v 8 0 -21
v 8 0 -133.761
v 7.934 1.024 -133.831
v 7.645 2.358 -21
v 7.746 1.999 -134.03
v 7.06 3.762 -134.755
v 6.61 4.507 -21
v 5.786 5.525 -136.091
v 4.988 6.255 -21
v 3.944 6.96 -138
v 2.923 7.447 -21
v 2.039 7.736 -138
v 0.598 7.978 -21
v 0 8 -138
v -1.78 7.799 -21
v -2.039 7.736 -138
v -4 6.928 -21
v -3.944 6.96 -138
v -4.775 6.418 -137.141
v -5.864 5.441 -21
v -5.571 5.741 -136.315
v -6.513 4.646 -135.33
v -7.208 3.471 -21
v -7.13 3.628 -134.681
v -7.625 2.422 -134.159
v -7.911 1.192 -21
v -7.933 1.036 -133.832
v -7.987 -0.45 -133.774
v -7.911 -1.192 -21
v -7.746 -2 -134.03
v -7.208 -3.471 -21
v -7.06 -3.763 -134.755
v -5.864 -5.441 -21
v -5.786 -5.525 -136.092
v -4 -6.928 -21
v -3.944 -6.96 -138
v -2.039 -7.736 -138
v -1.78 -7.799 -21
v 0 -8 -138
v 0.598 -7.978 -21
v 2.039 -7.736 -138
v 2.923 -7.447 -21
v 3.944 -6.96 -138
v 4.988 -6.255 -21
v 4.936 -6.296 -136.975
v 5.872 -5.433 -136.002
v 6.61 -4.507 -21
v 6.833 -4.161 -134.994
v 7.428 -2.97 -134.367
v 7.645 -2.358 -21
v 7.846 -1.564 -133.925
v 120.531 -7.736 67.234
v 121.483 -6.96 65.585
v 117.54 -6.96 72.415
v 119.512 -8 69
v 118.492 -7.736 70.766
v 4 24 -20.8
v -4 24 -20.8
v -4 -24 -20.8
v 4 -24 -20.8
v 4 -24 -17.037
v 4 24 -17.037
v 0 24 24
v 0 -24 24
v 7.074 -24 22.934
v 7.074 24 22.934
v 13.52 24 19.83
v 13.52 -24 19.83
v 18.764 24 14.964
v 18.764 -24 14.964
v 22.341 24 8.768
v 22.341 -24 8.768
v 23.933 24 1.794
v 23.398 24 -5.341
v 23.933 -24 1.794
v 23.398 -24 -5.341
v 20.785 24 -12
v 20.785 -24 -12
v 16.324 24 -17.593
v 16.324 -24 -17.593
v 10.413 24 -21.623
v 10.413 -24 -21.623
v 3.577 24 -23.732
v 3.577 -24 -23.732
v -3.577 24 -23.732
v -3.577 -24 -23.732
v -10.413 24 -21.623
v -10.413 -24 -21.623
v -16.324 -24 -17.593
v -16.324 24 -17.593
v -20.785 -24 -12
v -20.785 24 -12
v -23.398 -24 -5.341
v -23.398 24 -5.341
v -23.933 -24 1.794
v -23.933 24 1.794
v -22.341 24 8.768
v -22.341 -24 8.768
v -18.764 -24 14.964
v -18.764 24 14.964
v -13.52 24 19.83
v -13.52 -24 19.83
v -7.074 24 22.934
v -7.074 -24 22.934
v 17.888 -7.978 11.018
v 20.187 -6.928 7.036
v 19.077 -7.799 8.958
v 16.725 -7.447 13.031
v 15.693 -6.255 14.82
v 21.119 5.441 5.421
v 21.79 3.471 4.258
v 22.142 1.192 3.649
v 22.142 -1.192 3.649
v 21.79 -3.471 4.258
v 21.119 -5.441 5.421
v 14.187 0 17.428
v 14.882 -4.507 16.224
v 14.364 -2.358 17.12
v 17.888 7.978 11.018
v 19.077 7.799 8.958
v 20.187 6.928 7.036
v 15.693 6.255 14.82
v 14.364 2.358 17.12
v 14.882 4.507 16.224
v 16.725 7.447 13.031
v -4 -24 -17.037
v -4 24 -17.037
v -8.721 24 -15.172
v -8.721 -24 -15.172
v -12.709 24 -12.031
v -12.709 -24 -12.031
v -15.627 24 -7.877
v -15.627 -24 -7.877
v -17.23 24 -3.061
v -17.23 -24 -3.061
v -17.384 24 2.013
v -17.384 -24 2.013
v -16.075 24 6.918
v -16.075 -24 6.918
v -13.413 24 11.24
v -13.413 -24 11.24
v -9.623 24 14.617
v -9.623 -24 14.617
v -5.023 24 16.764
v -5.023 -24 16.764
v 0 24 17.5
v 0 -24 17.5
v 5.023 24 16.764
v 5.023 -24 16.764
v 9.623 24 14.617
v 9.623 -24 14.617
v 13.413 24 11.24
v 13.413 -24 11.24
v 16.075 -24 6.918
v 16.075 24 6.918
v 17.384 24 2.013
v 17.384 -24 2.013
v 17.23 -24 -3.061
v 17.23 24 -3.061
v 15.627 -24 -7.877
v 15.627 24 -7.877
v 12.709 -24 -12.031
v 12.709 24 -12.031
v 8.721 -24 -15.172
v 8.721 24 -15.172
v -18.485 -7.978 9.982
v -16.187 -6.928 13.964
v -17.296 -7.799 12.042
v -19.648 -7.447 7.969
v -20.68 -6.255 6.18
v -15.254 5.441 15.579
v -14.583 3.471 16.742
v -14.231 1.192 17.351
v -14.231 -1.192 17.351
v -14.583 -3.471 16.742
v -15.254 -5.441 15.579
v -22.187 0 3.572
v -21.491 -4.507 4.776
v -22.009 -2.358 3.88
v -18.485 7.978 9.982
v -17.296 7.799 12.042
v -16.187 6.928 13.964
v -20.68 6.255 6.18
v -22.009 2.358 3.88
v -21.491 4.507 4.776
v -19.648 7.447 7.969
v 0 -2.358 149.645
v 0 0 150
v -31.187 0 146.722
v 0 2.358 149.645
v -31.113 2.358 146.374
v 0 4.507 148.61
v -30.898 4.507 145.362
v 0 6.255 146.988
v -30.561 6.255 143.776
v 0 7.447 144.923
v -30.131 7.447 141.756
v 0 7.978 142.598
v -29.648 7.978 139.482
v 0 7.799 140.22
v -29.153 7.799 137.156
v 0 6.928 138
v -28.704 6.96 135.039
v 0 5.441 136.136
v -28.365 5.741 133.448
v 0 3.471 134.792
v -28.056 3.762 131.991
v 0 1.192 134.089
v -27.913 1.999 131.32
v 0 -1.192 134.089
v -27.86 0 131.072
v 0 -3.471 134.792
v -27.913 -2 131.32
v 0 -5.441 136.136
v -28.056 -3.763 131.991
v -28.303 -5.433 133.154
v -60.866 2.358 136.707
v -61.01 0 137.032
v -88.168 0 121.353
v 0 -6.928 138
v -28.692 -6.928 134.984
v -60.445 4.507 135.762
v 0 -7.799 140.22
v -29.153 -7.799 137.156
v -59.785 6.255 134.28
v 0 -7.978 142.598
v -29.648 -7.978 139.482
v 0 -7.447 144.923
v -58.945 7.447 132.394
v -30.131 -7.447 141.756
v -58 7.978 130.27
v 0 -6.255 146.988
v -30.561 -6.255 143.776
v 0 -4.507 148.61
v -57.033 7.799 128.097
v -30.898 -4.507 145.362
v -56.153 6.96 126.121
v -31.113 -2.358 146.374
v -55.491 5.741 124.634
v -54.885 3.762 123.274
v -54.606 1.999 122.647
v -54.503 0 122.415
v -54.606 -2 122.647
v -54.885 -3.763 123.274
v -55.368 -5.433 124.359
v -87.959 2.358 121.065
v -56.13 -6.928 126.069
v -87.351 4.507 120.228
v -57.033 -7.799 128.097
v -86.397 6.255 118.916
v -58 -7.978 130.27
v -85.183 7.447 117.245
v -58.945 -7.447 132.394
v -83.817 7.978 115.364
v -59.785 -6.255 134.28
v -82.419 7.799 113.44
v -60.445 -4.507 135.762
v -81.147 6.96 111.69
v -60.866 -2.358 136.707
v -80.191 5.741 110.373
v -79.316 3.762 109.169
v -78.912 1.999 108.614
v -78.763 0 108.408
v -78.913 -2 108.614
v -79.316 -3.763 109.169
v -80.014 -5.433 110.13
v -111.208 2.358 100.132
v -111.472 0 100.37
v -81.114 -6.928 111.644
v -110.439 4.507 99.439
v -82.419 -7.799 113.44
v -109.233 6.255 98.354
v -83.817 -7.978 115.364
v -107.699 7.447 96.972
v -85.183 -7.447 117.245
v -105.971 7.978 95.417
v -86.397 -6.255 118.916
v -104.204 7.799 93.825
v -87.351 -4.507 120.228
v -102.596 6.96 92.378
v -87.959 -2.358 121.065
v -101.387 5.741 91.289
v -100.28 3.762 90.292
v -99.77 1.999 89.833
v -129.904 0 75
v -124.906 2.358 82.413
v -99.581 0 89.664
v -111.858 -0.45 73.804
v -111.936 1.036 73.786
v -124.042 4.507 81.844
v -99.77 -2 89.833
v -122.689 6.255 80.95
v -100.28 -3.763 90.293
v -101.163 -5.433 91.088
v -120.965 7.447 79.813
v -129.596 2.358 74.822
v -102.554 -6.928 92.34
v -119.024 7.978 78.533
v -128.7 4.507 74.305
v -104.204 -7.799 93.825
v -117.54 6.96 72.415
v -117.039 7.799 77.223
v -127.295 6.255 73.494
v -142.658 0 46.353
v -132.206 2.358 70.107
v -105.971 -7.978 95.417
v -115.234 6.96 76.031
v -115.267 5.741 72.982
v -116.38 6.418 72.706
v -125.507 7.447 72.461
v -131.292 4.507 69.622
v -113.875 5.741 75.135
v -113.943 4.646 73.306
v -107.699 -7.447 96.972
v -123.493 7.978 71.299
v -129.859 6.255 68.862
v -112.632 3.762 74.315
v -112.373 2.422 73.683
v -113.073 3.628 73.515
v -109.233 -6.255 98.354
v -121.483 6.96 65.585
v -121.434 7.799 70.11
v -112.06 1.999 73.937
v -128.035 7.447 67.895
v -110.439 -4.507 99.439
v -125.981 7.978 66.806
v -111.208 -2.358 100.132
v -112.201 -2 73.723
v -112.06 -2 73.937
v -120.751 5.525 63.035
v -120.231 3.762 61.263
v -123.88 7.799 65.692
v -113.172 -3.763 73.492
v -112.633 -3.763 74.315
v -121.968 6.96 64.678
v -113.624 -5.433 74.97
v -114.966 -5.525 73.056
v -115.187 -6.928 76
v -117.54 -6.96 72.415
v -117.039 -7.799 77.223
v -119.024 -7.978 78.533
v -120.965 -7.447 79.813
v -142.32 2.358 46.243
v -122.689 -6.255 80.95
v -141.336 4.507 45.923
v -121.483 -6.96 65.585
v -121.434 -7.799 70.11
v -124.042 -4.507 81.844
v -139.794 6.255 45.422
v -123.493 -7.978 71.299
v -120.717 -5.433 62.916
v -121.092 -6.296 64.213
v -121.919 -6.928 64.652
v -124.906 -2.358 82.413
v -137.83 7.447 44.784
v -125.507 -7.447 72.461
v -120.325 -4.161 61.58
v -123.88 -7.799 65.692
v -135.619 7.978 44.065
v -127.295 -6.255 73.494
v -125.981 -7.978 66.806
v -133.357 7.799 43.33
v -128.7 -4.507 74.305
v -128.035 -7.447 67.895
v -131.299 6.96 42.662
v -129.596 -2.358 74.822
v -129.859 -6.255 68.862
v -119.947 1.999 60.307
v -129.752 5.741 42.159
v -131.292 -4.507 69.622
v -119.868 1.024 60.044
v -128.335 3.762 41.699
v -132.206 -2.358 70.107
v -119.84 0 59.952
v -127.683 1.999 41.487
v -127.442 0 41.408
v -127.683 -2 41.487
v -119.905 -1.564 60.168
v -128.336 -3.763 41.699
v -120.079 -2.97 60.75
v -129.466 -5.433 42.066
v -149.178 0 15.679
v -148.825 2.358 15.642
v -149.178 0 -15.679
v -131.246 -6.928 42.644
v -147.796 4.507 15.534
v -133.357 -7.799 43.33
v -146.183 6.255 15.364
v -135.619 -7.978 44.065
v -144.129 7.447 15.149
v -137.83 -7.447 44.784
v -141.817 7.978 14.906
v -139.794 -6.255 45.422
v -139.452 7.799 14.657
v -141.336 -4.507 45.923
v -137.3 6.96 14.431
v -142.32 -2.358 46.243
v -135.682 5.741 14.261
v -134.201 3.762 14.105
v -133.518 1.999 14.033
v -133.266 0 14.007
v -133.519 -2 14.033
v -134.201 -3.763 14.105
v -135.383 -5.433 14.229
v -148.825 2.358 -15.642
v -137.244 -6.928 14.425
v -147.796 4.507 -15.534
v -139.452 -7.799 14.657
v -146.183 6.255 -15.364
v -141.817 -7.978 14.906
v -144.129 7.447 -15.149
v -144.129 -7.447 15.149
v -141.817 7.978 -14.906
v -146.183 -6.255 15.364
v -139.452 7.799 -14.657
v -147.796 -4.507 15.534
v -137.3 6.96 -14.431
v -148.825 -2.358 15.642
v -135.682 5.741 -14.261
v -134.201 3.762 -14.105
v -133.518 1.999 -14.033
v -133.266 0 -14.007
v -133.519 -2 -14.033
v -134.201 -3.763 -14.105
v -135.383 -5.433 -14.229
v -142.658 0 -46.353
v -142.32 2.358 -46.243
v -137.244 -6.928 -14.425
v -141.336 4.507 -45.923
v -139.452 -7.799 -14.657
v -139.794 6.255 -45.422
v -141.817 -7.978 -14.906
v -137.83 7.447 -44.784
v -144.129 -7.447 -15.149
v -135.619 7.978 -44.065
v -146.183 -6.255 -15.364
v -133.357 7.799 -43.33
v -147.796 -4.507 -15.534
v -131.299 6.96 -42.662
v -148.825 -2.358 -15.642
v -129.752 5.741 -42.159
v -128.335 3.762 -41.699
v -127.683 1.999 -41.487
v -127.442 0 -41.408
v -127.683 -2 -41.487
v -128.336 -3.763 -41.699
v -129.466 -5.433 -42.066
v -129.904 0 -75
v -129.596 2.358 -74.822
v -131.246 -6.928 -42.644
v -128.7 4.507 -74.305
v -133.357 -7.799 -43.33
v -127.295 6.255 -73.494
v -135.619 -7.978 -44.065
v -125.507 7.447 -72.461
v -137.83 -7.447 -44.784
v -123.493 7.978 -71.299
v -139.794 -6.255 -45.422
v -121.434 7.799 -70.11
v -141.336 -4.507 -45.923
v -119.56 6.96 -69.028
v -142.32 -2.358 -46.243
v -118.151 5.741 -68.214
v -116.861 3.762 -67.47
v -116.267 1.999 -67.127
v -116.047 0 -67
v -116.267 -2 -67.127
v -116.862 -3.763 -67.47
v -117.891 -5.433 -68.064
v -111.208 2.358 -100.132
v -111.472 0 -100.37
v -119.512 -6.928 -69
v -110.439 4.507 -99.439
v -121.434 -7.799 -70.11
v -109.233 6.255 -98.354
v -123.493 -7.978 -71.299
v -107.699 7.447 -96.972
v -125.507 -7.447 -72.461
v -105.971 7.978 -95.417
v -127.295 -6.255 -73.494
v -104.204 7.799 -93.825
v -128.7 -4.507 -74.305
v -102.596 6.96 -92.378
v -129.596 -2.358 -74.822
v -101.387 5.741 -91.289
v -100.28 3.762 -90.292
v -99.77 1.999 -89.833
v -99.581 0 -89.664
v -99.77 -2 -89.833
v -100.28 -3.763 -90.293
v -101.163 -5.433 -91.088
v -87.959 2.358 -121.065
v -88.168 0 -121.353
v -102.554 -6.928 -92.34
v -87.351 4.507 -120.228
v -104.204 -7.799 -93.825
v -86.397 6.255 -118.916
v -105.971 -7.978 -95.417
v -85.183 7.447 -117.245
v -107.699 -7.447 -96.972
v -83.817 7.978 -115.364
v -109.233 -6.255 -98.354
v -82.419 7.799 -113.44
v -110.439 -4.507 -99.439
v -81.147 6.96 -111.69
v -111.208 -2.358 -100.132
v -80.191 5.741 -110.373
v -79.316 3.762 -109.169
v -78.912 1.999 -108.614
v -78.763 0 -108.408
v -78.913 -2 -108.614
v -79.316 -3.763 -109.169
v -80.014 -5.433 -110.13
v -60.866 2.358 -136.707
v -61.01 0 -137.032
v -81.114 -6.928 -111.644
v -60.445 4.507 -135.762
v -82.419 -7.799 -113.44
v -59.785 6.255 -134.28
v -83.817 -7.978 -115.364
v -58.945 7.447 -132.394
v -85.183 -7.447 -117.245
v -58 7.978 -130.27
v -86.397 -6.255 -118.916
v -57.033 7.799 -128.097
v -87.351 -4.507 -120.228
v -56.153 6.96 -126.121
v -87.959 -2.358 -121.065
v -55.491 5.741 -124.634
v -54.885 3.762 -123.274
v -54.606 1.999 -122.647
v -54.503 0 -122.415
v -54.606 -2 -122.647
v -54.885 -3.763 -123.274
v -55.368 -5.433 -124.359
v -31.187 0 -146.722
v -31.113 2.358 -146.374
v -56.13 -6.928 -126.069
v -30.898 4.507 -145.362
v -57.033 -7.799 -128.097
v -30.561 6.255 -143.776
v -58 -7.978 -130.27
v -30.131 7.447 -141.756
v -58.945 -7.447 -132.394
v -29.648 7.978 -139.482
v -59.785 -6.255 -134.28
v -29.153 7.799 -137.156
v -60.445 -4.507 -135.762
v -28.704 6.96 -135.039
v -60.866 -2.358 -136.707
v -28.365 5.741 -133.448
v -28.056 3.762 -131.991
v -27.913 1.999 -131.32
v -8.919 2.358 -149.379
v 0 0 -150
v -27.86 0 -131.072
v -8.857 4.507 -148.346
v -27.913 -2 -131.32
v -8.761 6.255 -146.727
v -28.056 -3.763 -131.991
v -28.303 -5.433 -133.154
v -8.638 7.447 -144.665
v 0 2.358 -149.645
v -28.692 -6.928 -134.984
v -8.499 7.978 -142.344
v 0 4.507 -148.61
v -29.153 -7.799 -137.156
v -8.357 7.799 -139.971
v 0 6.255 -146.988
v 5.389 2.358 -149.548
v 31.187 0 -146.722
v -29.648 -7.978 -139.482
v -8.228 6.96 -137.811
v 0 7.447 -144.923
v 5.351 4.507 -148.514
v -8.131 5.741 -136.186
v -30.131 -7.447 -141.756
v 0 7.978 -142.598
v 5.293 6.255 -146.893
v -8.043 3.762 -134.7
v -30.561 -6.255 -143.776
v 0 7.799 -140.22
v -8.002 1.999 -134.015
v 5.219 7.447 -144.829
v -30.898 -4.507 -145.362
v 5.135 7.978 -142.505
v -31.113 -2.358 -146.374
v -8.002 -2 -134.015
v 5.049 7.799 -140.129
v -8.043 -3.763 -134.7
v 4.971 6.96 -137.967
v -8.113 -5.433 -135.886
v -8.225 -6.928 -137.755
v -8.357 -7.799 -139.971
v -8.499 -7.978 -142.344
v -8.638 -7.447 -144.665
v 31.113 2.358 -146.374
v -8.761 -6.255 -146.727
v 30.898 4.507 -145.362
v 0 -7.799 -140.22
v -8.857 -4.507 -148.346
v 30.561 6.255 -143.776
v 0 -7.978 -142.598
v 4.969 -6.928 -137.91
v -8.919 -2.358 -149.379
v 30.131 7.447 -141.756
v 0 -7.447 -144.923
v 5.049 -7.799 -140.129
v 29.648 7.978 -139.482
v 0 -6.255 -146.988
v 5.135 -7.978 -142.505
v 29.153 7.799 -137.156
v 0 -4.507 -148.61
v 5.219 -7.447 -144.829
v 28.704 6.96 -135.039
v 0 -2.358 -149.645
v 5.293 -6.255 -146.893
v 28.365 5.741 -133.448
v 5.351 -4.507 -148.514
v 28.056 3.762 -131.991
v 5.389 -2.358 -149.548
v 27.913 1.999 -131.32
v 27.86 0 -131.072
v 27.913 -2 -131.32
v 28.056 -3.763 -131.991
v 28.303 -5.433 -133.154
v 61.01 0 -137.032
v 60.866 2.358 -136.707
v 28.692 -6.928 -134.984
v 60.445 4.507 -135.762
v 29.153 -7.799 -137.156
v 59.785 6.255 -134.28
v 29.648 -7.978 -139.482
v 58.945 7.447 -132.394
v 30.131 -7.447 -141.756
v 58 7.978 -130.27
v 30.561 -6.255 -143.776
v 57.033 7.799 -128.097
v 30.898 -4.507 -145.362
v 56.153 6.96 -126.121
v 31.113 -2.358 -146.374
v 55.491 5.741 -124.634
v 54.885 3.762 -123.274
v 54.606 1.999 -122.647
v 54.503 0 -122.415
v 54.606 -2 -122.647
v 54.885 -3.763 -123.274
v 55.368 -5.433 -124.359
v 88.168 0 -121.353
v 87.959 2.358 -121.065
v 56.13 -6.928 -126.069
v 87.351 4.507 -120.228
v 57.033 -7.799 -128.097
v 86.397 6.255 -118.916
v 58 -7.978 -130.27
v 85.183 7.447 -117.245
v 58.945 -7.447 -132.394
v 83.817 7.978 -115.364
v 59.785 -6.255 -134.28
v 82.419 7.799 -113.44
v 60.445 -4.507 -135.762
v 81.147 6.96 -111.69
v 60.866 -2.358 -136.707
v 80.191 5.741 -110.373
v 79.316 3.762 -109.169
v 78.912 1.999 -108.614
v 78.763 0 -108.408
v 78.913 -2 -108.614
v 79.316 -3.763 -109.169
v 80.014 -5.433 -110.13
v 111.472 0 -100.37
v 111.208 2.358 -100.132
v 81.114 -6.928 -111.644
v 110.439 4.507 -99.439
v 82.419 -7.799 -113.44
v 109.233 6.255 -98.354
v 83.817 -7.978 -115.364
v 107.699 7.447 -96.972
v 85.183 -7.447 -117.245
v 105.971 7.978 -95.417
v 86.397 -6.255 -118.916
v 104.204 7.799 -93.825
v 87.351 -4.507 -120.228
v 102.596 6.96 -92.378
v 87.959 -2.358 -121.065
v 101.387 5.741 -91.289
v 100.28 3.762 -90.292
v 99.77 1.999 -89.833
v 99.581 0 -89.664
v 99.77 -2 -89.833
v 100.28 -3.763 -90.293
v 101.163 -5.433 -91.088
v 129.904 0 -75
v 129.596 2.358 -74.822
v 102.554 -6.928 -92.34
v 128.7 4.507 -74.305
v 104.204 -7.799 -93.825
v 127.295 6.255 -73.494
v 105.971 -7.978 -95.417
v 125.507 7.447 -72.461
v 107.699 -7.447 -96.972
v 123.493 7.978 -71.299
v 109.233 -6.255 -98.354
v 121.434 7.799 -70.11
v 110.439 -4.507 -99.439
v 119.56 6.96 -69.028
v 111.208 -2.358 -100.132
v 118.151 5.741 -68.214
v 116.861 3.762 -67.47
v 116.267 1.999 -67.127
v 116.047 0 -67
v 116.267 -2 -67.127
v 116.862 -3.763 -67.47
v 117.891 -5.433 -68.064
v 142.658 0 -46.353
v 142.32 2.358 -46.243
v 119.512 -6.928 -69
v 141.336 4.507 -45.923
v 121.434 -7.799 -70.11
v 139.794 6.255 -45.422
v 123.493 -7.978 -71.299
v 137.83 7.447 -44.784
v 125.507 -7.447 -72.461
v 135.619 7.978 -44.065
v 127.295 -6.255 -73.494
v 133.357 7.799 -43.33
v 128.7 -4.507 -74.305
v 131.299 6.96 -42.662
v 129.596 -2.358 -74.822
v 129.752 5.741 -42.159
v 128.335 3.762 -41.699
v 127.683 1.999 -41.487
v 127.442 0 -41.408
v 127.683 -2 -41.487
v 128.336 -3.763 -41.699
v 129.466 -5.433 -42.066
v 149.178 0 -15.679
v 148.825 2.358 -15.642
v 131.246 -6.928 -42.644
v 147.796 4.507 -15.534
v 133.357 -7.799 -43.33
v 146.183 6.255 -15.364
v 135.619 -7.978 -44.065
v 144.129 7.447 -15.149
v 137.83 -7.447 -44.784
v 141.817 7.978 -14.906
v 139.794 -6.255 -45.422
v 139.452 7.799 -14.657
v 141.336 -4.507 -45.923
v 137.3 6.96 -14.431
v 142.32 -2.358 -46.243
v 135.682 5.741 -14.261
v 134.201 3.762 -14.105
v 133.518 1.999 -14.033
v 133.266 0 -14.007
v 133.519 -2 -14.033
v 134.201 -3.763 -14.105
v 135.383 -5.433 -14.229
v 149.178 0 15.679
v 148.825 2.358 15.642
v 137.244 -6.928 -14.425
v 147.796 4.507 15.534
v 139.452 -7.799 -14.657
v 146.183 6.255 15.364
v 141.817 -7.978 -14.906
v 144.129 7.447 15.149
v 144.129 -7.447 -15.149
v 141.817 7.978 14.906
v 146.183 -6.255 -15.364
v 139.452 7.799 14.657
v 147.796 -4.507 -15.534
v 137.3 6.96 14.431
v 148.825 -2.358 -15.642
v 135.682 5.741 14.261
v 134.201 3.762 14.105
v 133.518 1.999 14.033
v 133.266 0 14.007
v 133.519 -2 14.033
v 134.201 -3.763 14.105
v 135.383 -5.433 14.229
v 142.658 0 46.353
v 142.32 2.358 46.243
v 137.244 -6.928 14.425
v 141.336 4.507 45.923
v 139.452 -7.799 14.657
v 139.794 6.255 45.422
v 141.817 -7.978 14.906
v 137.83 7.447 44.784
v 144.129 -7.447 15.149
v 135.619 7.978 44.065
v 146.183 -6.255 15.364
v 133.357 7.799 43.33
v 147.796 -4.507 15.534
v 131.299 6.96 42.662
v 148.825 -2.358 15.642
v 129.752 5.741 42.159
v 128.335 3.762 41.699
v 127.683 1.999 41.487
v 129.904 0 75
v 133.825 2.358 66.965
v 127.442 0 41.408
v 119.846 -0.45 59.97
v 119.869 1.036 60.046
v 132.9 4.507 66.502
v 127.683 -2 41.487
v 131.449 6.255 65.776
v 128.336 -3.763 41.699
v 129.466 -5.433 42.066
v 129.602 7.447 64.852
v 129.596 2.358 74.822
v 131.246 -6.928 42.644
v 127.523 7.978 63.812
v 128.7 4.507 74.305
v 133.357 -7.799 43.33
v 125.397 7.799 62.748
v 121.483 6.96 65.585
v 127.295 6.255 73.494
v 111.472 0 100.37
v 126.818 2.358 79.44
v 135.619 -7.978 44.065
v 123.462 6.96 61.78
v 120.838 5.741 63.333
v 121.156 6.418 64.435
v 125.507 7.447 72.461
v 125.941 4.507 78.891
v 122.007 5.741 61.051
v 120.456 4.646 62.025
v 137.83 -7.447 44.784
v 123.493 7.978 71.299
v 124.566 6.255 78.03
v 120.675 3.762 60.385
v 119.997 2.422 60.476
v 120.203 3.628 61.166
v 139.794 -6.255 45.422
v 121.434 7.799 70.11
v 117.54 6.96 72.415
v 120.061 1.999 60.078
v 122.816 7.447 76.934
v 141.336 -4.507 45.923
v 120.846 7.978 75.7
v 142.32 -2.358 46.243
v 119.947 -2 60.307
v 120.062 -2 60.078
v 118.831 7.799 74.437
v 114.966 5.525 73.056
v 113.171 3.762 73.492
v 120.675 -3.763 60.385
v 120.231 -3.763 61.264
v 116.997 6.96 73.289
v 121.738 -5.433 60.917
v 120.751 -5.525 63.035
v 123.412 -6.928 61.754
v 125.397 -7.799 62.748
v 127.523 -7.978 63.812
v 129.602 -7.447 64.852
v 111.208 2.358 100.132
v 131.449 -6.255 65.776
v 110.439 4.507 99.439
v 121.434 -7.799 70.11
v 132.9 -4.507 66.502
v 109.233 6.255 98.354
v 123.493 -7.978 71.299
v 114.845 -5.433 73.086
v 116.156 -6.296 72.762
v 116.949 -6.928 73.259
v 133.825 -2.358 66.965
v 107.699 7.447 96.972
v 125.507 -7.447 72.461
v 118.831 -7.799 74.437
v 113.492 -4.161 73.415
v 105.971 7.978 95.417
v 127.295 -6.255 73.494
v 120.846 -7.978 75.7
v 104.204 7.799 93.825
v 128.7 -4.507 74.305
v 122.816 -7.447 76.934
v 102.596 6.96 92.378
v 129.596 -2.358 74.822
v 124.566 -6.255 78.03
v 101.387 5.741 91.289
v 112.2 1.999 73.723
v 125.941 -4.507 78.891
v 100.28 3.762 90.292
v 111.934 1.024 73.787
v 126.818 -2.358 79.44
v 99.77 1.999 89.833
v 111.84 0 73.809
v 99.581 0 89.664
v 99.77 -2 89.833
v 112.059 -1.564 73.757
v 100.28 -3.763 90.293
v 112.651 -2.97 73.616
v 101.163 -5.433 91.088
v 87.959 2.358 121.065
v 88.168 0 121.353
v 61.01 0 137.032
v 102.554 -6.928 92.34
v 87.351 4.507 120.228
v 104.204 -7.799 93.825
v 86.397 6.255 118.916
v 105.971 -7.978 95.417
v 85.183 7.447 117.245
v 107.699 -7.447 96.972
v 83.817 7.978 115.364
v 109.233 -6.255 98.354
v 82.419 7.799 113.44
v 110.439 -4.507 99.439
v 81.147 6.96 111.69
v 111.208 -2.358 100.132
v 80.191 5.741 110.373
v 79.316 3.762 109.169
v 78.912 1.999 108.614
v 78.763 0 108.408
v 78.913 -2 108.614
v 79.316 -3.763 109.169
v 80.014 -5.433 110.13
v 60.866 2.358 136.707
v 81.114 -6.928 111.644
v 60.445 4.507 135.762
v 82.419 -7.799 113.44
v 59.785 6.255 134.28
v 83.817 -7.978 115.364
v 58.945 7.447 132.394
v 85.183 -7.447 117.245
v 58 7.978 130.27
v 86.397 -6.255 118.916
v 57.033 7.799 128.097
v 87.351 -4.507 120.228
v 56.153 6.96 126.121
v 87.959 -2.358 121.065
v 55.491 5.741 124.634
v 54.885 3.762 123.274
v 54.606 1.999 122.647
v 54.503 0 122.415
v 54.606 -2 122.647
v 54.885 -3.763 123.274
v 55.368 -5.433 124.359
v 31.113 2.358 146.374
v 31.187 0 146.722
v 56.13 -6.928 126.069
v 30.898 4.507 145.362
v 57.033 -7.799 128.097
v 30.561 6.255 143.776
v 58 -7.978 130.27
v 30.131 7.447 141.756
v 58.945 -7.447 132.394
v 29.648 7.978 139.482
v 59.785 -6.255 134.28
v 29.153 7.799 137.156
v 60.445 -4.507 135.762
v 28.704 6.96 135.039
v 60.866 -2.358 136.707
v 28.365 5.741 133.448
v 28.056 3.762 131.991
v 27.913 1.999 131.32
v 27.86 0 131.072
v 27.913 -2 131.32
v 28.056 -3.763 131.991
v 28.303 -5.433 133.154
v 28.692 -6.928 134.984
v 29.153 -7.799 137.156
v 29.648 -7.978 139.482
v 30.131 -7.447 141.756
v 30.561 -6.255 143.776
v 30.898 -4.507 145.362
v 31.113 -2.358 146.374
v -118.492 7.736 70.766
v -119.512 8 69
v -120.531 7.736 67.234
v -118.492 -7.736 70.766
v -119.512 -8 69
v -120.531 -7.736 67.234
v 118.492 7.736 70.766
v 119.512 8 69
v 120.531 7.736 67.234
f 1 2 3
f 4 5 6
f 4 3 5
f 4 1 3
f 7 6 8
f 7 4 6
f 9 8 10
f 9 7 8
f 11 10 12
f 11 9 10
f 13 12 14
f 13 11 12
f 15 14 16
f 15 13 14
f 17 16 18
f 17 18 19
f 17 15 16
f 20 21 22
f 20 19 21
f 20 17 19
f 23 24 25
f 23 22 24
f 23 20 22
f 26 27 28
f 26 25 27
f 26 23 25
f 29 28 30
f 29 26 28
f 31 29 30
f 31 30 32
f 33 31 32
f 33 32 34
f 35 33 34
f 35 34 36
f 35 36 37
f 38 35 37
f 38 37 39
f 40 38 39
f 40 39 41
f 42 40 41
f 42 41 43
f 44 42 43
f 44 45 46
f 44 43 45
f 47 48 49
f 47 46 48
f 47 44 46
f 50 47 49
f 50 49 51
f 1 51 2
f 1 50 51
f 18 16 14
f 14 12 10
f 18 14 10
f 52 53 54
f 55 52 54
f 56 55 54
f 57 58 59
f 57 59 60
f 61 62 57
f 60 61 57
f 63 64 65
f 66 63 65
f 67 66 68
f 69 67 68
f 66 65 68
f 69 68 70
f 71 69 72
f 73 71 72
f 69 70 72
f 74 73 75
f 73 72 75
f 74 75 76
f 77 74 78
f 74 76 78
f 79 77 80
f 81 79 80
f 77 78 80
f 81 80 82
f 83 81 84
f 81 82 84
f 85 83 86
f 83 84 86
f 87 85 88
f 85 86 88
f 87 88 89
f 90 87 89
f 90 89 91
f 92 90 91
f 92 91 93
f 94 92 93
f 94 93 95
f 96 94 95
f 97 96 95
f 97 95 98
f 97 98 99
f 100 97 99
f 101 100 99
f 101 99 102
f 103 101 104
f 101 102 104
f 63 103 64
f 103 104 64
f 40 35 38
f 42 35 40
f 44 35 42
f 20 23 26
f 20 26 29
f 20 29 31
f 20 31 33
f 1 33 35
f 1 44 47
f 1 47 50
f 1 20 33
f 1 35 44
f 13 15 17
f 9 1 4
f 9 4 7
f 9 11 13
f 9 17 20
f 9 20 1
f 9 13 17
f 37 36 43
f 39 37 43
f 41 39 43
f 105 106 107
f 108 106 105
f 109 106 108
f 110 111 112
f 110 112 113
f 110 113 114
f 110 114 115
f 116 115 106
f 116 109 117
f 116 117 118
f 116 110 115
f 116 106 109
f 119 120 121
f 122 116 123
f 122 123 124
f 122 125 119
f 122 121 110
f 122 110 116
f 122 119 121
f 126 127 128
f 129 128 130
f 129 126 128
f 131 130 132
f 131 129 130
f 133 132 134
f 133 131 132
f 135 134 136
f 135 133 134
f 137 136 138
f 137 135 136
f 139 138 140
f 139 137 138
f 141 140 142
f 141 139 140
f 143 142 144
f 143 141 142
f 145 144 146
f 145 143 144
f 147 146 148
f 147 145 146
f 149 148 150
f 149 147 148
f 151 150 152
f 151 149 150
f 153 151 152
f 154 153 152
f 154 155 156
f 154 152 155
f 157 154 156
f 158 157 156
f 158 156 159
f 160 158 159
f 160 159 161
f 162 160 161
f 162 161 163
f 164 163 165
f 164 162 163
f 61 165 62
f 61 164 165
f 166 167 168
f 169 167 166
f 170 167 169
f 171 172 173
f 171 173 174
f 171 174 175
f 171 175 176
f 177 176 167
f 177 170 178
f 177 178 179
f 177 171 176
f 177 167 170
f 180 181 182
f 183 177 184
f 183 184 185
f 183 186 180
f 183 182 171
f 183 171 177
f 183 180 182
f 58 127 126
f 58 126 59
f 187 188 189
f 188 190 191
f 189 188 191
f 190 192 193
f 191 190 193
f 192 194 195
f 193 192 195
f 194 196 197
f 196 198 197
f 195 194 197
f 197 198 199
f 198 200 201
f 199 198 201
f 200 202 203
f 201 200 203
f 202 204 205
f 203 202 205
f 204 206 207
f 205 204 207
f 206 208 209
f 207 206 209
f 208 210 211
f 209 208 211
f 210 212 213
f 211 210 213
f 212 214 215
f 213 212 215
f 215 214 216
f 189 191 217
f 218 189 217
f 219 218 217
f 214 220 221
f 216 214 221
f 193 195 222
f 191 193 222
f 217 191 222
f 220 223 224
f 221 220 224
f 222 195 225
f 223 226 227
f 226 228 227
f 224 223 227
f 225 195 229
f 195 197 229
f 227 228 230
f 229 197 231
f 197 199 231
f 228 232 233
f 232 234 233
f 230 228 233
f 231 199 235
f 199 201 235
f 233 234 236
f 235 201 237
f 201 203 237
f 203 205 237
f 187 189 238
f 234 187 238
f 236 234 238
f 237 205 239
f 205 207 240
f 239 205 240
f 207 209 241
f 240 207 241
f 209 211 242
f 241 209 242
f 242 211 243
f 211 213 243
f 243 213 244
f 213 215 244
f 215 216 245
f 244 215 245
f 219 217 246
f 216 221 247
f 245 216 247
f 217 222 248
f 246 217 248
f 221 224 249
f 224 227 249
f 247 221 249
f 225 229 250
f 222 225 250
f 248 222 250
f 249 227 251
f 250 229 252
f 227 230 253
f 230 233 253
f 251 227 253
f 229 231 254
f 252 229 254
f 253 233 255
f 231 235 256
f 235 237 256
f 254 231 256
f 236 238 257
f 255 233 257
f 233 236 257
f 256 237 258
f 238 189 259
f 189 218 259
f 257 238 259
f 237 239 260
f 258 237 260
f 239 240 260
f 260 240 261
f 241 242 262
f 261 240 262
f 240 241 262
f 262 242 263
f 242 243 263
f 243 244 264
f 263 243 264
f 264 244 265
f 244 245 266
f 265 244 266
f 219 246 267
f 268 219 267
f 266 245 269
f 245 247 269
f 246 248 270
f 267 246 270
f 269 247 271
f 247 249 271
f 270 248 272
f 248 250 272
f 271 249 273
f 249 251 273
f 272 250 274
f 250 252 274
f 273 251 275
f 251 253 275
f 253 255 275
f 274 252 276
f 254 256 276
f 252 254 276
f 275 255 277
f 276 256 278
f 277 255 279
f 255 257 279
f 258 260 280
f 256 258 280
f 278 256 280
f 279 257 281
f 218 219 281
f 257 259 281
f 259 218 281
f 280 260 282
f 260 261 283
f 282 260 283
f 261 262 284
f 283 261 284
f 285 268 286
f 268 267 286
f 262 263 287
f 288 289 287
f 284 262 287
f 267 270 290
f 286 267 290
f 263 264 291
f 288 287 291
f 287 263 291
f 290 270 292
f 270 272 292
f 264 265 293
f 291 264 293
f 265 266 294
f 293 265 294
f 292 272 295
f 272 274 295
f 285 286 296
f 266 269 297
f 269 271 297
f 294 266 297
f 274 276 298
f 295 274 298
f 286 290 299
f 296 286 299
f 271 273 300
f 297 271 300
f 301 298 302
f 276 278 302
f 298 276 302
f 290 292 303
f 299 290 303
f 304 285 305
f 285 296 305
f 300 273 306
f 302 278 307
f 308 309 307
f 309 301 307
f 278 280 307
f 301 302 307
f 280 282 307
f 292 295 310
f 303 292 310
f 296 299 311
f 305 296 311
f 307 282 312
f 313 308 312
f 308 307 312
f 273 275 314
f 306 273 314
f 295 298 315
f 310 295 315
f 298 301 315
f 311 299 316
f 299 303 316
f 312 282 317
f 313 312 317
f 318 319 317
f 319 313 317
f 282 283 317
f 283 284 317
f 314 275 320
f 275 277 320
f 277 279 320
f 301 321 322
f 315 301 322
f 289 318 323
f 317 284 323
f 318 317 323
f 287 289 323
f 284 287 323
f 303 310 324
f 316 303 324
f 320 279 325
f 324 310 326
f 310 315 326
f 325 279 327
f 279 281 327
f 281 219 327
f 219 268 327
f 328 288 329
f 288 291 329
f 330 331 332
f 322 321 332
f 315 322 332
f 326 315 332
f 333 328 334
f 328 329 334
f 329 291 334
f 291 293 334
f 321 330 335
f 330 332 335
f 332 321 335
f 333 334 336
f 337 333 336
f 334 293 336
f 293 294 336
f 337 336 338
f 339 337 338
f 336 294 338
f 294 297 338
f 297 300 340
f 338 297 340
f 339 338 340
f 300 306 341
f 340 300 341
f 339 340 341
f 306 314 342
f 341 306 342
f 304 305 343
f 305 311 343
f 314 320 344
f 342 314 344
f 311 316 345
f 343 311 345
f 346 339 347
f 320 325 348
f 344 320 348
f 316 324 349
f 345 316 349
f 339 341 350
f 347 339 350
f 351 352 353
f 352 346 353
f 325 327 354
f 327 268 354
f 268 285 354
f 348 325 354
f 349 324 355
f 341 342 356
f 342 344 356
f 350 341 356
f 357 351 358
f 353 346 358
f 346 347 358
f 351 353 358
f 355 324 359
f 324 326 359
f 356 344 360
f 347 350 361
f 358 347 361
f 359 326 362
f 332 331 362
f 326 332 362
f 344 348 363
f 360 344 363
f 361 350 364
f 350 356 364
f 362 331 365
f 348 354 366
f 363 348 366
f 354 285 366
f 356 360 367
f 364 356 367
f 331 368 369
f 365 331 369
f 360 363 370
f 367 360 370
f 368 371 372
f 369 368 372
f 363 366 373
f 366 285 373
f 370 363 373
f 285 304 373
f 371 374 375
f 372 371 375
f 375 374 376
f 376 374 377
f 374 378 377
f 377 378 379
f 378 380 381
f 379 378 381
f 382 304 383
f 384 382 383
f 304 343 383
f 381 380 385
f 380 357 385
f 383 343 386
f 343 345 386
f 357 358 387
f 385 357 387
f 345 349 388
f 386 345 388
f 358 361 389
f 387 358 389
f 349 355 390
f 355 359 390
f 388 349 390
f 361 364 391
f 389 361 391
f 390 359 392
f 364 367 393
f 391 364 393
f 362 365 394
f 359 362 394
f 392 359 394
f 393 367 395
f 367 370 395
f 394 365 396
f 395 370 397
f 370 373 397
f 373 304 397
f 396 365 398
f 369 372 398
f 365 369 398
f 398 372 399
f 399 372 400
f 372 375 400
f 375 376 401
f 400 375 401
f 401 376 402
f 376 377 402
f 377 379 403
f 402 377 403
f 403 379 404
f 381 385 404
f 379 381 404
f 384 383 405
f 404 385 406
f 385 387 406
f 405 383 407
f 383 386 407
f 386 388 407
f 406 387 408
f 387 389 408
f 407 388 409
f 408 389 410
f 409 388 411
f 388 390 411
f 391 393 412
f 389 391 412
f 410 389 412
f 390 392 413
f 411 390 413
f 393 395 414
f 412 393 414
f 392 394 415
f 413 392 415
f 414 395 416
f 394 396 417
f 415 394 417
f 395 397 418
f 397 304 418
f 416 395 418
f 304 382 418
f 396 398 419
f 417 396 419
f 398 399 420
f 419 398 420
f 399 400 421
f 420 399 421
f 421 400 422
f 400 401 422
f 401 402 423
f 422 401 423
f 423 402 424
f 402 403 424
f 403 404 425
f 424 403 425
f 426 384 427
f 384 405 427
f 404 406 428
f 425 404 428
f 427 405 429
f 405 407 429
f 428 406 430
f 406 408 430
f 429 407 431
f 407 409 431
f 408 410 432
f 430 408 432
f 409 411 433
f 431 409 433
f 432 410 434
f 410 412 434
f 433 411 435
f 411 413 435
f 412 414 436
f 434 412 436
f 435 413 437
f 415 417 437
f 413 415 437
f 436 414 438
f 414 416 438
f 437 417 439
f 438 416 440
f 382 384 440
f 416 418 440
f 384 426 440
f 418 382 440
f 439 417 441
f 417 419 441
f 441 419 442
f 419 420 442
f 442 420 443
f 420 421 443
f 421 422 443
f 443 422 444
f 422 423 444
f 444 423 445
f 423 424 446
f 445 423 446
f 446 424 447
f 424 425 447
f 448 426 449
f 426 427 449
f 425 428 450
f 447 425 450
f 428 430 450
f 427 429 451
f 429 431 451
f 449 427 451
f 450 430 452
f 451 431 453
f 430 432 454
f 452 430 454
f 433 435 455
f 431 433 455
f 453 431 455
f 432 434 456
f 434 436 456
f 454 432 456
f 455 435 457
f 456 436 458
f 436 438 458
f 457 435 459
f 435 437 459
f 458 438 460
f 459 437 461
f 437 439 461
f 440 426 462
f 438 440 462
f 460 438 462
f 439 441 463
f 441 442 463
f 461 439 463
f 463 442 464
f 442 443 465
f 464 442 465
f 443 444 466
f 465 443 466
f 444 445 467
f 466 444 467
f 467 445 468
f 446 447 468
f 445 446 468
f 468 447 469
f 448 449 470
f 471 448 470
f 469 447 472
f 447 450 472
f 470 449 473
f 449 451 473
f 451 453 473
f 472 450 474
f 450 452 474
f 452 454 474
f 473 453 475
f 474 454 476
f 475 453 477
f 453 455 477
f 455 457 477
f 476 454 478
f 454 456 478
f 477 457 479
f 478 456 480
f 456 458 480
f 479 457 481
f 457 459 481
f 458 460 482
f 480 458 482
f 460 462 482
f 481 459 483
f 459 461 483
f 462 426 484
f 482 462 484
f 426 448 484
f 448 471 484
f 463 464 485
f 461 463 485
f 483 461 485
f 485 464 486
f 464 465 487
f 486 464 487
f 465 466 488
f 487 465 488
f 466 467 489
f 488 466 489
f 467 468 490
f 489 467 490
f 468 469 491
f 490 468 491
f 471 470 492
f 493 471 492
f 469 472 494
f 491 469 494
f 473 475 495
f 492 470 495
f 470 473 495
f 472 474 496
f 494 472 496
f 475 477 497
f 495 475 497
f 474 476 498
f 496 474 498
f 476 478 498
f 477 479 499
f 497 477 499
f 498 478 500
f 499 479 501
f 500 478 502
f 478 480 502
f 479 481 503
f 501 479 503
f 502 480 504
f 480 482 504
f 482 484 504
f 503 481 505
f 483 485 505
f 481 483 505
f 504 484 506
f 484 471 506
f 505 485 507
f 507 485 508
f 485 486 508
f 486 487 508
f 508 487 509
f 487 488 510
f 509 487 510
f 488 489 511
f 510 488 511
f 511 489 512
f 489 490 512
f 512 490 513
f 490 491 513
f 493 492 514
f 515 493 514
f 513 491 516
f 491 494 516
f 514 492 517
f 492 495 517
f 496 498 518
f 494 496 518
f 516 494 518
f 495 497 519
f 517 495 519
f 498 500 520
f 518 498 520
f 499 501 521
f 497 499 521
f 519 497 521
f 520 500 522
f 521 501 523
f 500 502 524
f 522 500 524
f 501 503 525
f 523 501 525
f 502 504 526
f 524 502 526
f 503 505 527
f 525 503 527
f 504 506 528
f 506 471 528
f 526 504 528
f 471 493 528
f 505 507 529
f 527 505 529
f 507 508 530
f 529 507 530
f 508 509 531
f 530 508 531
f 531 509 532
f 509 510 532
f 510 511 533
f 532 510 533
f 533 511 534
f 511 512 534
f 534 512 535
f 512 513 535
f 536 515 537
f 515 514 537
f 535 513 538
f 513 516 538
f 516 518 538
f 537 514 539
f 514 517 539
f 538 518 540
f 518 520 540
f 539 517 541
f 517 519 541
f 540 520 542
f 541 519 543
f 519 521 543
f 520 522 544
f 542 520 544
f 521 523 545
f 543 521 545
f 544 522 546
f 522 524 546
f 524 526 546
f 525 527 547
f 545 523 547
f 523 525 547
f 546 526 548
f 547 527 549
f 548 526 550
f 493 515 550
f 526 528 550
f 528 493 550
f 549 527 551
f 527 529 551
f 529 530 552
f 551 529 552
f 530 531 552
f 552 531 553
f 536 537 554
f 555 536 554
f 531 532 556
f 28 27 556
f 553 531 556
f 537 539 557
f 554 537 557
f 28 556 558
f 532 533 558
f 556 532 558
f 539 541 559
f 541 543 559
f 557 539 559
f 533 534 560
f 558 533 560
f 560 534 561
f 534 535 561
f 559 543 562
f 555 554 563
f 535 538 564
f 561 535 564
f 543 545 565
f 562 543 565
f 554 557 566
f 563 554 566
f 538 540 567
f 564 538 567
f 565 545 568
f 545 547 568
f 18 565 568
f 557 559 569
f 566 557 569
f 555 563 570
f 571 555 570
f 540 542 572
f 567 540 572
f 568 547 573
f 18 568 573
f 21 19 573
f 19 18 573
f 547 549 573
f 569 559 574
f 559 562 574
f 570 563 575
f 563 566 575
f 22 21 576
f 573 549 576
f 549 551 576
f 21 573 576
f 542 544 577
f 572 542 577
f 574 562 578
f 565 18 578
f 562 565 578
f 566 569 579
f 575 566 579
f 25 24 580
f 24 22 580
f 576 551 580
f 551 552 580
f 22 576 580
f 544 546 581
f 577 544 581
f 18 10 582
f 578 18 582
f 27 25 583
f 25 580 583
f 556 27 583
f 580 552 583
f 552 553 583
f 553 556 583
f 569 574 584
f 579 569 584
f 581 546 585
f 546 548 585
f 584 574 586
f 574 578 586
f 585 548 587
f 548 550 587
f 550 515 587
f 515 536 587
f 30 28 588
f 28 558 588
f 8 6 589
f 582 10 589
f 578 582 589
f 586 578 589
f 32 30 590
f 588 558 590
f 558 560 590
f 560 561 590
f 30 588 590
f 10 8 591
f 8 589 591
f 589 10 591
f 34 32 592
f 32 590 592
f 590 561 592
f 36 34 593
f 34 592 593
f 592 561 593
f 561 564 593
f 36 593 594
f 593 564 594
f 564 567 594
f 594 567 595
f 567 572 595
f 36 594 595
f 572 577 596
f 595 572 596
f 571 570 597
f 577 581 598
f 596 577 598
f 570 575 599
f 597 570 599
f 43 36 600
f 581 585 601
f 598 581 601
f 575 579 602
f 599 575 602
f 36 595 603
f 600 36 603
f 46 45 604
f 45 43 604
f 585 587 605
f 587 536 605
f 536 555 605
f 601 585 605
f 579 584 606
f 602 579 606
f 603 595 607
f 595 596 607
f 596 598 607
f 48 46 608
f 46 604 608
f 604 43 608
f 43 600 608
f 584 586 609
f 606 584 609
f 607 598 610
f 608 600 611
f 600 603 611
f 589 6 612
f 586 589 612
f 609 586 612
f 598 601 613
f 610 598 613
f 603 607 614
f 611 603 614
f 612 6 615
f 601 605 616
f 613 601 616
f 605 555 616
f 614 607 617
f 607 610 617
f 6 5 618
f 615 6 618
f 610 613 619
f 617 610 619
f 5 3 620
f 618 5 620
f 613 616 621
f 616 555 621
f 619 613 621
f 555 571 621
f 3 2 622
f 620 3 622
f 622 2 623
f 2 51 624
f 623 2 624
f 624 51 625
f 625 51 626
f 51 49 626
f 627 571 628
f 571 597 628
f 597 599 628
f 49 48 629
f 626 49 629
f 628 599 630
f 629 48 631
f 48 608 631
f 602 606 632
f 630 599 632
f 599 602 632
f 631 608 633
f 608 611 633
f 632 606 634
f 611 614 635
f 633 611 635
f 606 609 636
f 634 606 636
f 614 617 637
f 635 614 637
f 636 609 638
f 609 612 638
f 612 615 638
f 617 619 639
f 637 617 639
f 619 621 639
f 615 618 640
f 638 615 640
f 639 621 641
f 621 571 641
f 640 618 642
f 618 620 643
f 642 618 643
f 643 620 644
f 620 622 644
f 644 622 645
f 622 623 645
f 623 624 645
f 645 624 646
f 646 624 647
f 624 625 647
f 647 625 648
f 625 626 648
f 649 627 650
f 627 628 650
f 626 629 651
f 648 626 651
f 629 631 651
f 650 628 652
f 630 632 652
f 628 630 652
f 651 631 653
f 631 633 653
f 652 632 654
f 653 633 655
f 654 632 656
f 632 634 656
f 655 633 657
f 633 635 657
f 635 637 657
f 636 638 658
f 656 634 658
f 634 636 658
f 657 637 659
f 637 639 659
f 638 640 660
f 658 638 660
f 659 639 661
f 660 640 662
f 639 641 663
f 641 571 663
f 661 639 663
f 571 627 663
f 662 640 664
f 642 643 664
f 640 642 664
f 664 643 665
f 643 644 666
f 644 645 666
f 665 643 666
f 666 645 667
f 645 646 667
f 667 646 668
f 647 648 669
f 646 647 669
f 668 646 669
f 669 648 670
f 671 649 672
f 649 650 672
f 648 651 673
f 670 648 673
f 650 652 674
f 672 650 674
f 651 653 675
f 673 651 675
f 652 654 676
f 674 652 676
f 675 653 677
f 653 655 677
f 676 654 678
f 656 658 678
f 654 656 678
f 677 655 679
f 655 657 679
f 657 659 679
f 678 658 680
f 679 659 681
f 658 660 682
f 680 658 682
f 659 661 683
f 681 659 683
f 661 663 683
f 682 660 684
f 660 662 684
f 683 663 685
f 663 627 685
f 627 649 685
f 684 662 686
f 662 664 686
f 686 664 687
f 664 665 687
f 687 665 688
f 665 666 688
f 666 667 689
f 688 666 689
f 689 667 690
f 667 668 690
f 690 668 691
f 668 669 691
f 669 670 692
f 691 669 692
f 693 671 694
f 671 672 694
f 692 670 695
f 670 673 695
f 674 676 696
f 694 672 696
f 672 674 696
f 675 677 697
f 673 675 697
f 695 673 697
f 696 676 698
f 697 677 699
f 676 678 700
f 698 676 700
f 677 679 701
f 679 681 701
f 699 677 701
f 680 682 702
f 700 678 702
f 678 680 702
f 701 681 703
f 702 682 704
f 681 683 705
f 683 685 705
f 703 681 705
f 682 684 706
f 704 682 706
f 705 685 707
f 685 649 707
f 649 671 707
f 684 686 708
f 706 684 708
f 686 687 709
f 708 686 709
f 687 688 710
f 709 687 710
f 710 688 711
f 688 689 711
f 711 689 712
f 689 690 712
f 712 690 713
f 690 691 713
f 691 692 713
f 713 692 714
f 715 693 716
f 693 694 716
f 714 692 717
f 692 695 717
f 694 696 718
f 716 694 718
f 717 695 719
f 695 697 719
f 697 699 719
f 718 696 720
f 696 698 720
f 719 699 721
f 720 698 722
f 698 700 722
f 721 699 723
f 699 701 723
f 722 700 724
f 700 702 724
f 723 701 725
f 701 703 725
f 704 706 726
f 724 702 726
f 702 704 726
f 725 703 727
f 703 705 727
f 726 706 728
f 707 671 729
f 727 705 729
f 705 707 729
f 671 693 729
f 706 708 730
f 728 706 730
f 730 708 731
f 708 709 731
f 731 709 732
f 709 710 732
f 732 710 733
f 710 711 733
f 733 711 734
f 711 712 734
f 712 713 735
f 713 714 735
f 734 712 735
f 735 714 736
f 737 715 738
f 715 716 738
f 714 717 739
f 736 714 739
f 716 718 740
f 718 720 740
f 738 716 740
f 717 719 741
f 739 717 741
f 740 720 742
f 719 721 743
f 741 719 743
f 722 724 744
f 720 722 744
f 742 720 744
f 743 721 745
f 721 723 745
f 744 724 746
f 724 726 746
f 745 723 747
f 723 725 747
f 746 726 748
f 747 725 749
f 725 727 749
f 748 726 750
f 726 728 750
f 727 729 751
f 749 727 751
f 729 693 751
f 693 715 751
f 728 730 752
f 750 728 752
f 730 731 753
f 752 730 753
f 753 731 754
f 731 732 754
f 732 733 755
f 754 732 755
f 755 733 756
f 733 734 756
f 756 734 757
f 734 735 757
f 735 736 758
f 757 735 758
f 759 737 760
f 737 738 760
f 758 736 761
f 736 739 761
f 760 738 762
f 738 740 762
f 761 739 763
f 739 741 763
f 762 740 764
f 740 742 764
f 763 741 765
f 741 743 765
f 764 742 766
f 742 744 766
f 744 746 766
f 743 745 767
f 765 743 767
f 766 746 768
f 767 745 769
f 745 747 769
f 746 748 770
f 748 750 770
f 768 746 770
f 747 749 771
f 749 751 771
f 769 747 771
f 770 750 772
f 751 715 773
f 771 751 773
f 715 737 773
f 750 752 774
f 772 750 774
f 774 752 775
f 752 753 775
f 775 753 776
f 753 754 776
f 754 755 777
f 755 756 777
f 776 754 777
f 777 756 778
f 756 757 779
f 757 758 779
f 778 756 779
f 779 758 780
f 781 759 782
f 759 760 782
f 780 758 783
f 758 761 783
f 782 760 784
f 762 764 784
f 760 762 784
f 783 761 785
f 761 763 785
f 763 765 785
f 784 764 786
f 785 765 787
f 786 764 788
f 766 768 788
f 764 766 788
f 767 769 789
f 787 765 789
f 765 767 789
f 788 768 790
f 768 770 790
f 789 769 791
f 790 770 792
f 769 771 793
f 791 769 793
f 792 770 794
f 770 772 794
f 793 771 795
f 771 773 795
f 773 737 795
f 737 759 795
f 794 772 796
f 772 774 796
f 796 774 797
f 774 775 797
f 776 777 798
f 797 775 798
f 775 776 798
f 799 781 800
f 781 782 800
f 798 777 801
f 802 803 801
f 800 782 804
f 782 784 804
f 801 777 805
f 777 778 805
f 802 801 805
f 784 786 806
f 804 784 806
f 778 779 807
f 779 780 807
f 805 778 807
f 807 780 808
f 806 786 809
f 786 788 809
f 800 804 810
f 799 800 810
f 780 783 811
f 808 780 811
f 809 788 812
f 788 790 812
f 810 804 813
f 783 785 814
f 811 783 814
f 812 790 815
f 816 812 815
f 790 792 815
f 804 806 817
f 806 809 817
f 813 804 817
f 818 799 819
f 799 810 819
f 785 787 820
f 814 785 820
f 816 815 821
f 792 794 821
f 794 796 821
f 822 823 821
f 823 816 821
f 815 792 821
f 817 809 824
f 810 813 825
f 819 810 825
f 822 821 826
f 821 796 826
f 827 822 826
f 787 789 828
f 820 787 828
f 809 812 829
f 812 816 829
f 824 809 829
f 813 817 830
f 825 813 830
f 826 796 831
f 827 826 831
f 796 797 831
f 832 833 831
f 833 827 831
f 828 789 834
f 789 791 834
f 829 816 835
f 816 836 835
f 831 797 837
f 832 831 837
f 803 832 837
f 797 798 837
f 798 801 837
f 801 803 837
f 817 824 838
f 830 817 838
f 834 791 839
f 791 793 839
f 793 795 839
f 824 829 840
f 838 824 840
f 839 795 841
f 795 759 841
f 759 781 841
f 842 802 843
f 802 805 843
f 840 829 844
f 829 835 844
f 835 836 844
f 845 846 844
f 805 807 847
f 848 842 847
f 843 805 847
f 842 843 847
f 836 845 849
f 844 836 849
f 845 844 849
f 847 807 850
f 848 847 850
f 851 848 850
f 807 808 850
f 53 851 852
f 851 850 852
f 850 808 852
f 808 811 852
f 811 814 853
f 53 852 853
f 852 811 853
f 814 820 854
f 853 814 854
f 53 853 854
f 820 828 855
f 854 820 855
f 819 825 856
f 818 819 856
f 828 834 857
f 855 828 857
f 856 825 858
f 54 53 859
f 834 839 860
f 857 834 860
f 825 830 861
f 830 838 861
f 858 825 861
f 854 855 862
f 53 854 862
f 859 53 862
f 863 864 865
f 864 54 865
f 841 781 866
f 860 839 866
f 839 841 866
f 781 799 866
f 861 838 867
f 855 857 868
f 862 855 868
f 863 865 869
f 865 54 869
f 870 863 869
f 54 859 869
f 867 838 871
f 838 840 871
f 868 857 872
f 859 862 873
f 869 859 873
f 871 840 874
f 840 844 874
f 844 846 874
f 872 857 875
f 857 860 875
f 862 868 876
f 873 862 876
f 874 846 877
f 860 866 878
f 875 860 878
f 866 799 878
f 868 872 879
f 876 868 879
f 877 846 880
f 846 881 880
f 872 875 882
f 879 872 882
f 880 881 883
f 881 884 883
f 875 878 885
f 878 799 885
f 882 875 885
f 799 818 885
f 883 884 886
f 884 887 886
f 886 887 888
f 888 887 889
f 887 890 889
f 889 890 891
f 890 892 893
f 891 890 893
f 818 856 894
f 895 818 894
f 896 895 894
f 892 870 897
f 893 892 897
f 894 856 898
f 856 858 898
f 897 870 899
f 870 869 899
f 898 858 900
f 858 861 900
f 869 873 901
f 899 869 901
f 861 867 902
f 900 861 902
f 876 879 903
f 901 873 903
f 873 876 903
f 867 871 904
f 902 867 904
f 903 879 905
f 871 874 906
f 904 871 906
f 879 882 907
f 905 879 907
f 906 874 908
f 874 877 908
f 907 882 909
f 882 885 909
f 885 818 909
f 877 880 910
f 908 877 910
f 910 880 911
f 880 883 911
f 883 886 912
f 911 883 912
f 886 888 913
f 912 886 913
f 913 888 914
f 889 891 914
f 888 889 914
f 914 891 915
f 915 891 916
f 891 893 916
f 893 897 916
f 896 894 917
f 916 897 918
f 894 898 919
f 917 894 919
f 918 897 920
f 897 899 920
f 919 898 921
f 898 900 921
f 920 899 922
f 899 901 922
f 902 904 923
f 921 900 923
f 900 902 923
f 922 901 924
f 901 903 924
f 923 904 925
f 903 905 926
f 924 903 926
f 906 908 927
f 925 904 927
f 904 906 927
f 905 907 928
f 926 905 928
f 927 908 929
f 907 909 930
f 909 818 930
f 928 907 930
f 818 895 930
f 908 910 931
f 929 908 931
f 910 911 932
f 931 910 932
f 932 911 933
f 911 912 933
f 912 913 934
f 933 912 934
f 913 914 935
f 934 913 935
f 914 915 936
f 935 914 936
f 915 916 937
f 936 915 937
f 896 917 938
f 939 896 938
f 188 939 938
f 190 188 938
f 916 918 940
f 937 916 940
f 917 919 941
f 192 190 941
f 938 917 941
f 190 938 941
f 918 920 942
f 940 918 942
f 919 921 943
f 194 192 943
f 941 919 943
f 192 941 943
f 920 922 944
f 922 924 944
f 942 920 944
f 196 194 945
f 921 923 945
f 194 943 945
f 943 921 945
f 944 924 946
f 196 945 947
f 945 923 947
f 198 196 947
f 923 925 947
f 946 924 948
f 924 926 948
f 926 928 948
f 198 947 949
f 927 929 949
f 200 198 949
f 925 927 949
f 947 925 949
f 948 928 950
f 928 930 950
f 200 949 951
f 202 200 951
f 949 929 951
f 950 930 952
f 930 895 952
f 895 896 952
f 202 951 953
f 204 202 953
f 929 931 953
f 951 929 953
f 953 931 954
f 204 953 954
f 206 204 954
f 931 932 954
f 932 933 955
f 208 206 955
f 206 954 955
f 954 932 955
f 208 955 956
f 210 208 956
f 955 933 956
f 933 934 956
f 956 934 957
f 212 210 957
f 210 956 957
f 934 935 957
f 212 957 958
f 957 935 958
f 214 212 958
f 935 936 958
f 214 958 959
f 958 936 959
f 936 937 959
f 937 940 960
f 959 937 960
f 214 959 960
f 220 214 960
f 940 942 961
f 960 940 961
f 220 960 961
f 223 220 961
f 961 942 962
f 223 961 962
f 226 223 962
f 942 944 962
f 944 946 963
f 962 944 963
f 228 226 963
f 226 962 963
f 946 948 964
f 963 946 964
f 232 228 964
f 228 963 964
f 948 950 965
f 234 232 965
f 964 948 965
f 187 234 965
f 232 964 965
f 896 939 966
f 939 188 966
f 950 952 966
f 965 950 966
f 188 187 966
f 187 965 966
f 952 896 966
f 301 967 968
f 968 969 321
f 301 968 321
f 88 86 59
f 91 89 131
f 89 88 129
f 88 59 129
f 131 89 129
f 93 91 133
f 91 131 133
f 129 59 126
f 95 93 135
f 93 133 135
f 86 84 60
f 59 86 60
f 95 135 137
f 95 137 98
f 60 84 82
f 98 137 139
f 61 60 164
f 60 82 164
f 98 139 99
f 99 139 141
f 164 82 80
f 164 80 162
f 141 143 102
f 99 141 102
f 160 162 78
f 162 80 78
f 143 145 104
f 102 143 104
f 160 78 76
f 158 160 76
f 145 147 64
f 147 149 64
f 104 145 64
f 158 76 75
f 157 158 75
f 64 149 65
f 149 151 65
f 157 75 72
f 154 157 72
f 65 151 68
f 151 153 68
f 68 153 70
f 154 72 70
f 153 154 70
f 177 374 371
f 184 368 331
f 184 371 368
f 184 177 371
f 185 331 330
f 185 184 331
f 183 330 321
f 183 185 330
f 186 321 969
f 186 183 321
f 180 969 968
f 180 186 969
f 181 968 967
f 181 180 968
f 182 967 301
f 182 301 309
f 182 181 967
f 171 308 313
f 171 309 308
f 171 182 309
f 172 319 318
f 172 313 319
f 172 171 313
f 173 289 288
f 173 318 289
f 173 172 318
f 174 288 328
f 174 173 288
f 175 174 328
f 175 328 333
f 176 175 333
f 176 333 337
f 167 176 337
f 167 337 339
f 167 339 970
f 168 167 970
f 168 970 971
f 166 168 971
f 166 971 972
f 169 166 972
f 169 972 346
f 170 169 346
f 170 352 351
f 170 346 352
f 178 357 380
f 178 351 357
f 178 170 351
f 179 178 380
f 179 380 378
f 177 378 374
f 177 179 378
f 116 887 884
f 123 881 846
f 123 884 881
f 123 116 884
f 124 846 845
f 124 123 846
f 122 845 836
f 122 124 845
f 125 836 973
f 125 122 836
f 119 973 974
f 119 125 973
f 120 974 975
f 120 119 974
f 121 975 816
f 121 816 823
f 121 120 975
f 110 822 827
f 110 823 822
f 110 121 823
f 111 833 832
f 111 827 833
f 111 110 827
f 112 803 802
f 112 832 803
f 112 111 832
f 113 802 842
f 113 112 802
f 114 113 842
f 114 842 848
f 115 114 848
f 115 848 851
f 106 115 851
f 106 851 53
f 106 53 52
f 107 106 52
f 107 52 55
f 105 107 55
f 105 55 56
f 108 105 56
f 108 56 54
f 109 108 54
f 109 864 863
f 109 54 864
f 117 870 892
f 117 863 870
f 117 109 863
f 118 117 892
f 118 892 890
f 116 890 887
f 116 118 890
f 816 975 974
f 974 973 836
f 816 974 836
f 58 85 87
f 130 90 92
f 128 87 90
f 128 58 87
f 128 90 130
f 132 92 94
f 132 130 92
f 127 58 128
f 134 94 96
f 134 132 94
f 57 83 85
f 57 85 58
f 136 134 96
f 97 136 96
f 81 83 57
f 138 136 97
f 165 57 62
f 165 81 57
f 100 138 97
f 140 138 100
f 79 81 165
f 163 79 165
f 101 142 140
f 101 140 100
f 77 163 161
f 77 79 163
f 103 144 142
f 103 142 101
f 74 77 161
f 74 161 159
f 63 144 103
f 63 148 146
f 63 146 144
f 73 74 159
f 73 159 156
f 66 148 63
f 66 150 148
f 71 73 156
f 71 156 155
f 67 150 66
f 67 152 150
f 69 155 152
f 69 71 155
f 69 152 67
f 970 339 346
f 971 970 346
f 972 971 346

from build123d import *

# Parameters (mm, degrees)
SKETCH1_R                = 8
BOSS_EXTRUDE1_DEPTH      = 24
BOSS_EXTRUDE1_DEPTH_BACK = 24
SKETCH2_R                = 24
SKETCH2_R_2              = 17.5
SKETCH3_R                = 8
BOSS_EXTRUDE4_DEPTH      = 117
CIRPATTERN1_COUNT        = 3
SKETCH4_W                = 8
SKETCH4_H                = 23.550074586
CUT_EXTRUDE1_DEPTH       = 105


with BuildPart() as part:
    # Sketch1 → Revolve1 (revolve)
    with BuildSketch(Plane.XY, mode=Mode.PRIVATE) as revolve1_sk:
        with Locations((142, 0)):
            Circle(SKETCH1_R)
    revolve(revolve1_sk.sketch.rotate(Axis((0, 0, 0), (0, -1, 0)), 90), axis=Axis((0, 0, 0), (0, -1, 0)))

    # Sketch3 → Boss-Extrude4 (add)
    with BuildSketch(Plane.XY.offset(-21)):
        Circle(SKETCH3_R)
    boss_extrude4 = extrude(amount=-BOSS_EXTRUDE4_DEPTH)

    # CirPattern1: Boss-Extrude4 ×3 about axis
    cirpattern1_axis = Axis((0, 0, 0), (0, 1, 0))
    for i in range(1, CIRPATTERN1_COUNT):
        add(boss_extrude4.rotate(cirpattern1_axis, i * 360 / CIRPATTERN1_COUNT))


with BuildPart() as body_2:
    # Sketch2 → Boss-Extrude1 (new, two sides: drawn at the far end of the back side and taken through both)
    with BuildSketch(Plane(origin=(0, 0, 0), x_dir=(1, 0, 0), z_dir=(0, 1, 0)).offset(-BOSS_EXTRUDE1_DEPTH_BACK)):
        with Locations(Location((0, 0, 0), (0, 0, 270))):
            Circle(SKETCH2_R)
        with Locations(Location((0, 0, 0), (0, 0, 270))):
            Circle(SKETCH2_R_2, mode=Mode.SUBTRACT)
    extrude(amount=BOSS_EXTRUDE1_DEPTH + BOSS_EXTRUDE1_DEPTH_BACK)

    # Sketch4 → Cut-Extrude1 (cut)
    with BuildSketch(Plane(origin=(0, 24, 0), x_dir=(1, 0, 0), z_dir=(0, 1, 0))):
        with Locations((0, 9.024962707)):
            Rectangle(SKETCH4_W, SKETCH4_H)
    extrude(amount=-CUT_EXTRUDE1_DEPTH, mode=Mode.SUBTRACT)


solid = Compound([part.part, body_2.part])
